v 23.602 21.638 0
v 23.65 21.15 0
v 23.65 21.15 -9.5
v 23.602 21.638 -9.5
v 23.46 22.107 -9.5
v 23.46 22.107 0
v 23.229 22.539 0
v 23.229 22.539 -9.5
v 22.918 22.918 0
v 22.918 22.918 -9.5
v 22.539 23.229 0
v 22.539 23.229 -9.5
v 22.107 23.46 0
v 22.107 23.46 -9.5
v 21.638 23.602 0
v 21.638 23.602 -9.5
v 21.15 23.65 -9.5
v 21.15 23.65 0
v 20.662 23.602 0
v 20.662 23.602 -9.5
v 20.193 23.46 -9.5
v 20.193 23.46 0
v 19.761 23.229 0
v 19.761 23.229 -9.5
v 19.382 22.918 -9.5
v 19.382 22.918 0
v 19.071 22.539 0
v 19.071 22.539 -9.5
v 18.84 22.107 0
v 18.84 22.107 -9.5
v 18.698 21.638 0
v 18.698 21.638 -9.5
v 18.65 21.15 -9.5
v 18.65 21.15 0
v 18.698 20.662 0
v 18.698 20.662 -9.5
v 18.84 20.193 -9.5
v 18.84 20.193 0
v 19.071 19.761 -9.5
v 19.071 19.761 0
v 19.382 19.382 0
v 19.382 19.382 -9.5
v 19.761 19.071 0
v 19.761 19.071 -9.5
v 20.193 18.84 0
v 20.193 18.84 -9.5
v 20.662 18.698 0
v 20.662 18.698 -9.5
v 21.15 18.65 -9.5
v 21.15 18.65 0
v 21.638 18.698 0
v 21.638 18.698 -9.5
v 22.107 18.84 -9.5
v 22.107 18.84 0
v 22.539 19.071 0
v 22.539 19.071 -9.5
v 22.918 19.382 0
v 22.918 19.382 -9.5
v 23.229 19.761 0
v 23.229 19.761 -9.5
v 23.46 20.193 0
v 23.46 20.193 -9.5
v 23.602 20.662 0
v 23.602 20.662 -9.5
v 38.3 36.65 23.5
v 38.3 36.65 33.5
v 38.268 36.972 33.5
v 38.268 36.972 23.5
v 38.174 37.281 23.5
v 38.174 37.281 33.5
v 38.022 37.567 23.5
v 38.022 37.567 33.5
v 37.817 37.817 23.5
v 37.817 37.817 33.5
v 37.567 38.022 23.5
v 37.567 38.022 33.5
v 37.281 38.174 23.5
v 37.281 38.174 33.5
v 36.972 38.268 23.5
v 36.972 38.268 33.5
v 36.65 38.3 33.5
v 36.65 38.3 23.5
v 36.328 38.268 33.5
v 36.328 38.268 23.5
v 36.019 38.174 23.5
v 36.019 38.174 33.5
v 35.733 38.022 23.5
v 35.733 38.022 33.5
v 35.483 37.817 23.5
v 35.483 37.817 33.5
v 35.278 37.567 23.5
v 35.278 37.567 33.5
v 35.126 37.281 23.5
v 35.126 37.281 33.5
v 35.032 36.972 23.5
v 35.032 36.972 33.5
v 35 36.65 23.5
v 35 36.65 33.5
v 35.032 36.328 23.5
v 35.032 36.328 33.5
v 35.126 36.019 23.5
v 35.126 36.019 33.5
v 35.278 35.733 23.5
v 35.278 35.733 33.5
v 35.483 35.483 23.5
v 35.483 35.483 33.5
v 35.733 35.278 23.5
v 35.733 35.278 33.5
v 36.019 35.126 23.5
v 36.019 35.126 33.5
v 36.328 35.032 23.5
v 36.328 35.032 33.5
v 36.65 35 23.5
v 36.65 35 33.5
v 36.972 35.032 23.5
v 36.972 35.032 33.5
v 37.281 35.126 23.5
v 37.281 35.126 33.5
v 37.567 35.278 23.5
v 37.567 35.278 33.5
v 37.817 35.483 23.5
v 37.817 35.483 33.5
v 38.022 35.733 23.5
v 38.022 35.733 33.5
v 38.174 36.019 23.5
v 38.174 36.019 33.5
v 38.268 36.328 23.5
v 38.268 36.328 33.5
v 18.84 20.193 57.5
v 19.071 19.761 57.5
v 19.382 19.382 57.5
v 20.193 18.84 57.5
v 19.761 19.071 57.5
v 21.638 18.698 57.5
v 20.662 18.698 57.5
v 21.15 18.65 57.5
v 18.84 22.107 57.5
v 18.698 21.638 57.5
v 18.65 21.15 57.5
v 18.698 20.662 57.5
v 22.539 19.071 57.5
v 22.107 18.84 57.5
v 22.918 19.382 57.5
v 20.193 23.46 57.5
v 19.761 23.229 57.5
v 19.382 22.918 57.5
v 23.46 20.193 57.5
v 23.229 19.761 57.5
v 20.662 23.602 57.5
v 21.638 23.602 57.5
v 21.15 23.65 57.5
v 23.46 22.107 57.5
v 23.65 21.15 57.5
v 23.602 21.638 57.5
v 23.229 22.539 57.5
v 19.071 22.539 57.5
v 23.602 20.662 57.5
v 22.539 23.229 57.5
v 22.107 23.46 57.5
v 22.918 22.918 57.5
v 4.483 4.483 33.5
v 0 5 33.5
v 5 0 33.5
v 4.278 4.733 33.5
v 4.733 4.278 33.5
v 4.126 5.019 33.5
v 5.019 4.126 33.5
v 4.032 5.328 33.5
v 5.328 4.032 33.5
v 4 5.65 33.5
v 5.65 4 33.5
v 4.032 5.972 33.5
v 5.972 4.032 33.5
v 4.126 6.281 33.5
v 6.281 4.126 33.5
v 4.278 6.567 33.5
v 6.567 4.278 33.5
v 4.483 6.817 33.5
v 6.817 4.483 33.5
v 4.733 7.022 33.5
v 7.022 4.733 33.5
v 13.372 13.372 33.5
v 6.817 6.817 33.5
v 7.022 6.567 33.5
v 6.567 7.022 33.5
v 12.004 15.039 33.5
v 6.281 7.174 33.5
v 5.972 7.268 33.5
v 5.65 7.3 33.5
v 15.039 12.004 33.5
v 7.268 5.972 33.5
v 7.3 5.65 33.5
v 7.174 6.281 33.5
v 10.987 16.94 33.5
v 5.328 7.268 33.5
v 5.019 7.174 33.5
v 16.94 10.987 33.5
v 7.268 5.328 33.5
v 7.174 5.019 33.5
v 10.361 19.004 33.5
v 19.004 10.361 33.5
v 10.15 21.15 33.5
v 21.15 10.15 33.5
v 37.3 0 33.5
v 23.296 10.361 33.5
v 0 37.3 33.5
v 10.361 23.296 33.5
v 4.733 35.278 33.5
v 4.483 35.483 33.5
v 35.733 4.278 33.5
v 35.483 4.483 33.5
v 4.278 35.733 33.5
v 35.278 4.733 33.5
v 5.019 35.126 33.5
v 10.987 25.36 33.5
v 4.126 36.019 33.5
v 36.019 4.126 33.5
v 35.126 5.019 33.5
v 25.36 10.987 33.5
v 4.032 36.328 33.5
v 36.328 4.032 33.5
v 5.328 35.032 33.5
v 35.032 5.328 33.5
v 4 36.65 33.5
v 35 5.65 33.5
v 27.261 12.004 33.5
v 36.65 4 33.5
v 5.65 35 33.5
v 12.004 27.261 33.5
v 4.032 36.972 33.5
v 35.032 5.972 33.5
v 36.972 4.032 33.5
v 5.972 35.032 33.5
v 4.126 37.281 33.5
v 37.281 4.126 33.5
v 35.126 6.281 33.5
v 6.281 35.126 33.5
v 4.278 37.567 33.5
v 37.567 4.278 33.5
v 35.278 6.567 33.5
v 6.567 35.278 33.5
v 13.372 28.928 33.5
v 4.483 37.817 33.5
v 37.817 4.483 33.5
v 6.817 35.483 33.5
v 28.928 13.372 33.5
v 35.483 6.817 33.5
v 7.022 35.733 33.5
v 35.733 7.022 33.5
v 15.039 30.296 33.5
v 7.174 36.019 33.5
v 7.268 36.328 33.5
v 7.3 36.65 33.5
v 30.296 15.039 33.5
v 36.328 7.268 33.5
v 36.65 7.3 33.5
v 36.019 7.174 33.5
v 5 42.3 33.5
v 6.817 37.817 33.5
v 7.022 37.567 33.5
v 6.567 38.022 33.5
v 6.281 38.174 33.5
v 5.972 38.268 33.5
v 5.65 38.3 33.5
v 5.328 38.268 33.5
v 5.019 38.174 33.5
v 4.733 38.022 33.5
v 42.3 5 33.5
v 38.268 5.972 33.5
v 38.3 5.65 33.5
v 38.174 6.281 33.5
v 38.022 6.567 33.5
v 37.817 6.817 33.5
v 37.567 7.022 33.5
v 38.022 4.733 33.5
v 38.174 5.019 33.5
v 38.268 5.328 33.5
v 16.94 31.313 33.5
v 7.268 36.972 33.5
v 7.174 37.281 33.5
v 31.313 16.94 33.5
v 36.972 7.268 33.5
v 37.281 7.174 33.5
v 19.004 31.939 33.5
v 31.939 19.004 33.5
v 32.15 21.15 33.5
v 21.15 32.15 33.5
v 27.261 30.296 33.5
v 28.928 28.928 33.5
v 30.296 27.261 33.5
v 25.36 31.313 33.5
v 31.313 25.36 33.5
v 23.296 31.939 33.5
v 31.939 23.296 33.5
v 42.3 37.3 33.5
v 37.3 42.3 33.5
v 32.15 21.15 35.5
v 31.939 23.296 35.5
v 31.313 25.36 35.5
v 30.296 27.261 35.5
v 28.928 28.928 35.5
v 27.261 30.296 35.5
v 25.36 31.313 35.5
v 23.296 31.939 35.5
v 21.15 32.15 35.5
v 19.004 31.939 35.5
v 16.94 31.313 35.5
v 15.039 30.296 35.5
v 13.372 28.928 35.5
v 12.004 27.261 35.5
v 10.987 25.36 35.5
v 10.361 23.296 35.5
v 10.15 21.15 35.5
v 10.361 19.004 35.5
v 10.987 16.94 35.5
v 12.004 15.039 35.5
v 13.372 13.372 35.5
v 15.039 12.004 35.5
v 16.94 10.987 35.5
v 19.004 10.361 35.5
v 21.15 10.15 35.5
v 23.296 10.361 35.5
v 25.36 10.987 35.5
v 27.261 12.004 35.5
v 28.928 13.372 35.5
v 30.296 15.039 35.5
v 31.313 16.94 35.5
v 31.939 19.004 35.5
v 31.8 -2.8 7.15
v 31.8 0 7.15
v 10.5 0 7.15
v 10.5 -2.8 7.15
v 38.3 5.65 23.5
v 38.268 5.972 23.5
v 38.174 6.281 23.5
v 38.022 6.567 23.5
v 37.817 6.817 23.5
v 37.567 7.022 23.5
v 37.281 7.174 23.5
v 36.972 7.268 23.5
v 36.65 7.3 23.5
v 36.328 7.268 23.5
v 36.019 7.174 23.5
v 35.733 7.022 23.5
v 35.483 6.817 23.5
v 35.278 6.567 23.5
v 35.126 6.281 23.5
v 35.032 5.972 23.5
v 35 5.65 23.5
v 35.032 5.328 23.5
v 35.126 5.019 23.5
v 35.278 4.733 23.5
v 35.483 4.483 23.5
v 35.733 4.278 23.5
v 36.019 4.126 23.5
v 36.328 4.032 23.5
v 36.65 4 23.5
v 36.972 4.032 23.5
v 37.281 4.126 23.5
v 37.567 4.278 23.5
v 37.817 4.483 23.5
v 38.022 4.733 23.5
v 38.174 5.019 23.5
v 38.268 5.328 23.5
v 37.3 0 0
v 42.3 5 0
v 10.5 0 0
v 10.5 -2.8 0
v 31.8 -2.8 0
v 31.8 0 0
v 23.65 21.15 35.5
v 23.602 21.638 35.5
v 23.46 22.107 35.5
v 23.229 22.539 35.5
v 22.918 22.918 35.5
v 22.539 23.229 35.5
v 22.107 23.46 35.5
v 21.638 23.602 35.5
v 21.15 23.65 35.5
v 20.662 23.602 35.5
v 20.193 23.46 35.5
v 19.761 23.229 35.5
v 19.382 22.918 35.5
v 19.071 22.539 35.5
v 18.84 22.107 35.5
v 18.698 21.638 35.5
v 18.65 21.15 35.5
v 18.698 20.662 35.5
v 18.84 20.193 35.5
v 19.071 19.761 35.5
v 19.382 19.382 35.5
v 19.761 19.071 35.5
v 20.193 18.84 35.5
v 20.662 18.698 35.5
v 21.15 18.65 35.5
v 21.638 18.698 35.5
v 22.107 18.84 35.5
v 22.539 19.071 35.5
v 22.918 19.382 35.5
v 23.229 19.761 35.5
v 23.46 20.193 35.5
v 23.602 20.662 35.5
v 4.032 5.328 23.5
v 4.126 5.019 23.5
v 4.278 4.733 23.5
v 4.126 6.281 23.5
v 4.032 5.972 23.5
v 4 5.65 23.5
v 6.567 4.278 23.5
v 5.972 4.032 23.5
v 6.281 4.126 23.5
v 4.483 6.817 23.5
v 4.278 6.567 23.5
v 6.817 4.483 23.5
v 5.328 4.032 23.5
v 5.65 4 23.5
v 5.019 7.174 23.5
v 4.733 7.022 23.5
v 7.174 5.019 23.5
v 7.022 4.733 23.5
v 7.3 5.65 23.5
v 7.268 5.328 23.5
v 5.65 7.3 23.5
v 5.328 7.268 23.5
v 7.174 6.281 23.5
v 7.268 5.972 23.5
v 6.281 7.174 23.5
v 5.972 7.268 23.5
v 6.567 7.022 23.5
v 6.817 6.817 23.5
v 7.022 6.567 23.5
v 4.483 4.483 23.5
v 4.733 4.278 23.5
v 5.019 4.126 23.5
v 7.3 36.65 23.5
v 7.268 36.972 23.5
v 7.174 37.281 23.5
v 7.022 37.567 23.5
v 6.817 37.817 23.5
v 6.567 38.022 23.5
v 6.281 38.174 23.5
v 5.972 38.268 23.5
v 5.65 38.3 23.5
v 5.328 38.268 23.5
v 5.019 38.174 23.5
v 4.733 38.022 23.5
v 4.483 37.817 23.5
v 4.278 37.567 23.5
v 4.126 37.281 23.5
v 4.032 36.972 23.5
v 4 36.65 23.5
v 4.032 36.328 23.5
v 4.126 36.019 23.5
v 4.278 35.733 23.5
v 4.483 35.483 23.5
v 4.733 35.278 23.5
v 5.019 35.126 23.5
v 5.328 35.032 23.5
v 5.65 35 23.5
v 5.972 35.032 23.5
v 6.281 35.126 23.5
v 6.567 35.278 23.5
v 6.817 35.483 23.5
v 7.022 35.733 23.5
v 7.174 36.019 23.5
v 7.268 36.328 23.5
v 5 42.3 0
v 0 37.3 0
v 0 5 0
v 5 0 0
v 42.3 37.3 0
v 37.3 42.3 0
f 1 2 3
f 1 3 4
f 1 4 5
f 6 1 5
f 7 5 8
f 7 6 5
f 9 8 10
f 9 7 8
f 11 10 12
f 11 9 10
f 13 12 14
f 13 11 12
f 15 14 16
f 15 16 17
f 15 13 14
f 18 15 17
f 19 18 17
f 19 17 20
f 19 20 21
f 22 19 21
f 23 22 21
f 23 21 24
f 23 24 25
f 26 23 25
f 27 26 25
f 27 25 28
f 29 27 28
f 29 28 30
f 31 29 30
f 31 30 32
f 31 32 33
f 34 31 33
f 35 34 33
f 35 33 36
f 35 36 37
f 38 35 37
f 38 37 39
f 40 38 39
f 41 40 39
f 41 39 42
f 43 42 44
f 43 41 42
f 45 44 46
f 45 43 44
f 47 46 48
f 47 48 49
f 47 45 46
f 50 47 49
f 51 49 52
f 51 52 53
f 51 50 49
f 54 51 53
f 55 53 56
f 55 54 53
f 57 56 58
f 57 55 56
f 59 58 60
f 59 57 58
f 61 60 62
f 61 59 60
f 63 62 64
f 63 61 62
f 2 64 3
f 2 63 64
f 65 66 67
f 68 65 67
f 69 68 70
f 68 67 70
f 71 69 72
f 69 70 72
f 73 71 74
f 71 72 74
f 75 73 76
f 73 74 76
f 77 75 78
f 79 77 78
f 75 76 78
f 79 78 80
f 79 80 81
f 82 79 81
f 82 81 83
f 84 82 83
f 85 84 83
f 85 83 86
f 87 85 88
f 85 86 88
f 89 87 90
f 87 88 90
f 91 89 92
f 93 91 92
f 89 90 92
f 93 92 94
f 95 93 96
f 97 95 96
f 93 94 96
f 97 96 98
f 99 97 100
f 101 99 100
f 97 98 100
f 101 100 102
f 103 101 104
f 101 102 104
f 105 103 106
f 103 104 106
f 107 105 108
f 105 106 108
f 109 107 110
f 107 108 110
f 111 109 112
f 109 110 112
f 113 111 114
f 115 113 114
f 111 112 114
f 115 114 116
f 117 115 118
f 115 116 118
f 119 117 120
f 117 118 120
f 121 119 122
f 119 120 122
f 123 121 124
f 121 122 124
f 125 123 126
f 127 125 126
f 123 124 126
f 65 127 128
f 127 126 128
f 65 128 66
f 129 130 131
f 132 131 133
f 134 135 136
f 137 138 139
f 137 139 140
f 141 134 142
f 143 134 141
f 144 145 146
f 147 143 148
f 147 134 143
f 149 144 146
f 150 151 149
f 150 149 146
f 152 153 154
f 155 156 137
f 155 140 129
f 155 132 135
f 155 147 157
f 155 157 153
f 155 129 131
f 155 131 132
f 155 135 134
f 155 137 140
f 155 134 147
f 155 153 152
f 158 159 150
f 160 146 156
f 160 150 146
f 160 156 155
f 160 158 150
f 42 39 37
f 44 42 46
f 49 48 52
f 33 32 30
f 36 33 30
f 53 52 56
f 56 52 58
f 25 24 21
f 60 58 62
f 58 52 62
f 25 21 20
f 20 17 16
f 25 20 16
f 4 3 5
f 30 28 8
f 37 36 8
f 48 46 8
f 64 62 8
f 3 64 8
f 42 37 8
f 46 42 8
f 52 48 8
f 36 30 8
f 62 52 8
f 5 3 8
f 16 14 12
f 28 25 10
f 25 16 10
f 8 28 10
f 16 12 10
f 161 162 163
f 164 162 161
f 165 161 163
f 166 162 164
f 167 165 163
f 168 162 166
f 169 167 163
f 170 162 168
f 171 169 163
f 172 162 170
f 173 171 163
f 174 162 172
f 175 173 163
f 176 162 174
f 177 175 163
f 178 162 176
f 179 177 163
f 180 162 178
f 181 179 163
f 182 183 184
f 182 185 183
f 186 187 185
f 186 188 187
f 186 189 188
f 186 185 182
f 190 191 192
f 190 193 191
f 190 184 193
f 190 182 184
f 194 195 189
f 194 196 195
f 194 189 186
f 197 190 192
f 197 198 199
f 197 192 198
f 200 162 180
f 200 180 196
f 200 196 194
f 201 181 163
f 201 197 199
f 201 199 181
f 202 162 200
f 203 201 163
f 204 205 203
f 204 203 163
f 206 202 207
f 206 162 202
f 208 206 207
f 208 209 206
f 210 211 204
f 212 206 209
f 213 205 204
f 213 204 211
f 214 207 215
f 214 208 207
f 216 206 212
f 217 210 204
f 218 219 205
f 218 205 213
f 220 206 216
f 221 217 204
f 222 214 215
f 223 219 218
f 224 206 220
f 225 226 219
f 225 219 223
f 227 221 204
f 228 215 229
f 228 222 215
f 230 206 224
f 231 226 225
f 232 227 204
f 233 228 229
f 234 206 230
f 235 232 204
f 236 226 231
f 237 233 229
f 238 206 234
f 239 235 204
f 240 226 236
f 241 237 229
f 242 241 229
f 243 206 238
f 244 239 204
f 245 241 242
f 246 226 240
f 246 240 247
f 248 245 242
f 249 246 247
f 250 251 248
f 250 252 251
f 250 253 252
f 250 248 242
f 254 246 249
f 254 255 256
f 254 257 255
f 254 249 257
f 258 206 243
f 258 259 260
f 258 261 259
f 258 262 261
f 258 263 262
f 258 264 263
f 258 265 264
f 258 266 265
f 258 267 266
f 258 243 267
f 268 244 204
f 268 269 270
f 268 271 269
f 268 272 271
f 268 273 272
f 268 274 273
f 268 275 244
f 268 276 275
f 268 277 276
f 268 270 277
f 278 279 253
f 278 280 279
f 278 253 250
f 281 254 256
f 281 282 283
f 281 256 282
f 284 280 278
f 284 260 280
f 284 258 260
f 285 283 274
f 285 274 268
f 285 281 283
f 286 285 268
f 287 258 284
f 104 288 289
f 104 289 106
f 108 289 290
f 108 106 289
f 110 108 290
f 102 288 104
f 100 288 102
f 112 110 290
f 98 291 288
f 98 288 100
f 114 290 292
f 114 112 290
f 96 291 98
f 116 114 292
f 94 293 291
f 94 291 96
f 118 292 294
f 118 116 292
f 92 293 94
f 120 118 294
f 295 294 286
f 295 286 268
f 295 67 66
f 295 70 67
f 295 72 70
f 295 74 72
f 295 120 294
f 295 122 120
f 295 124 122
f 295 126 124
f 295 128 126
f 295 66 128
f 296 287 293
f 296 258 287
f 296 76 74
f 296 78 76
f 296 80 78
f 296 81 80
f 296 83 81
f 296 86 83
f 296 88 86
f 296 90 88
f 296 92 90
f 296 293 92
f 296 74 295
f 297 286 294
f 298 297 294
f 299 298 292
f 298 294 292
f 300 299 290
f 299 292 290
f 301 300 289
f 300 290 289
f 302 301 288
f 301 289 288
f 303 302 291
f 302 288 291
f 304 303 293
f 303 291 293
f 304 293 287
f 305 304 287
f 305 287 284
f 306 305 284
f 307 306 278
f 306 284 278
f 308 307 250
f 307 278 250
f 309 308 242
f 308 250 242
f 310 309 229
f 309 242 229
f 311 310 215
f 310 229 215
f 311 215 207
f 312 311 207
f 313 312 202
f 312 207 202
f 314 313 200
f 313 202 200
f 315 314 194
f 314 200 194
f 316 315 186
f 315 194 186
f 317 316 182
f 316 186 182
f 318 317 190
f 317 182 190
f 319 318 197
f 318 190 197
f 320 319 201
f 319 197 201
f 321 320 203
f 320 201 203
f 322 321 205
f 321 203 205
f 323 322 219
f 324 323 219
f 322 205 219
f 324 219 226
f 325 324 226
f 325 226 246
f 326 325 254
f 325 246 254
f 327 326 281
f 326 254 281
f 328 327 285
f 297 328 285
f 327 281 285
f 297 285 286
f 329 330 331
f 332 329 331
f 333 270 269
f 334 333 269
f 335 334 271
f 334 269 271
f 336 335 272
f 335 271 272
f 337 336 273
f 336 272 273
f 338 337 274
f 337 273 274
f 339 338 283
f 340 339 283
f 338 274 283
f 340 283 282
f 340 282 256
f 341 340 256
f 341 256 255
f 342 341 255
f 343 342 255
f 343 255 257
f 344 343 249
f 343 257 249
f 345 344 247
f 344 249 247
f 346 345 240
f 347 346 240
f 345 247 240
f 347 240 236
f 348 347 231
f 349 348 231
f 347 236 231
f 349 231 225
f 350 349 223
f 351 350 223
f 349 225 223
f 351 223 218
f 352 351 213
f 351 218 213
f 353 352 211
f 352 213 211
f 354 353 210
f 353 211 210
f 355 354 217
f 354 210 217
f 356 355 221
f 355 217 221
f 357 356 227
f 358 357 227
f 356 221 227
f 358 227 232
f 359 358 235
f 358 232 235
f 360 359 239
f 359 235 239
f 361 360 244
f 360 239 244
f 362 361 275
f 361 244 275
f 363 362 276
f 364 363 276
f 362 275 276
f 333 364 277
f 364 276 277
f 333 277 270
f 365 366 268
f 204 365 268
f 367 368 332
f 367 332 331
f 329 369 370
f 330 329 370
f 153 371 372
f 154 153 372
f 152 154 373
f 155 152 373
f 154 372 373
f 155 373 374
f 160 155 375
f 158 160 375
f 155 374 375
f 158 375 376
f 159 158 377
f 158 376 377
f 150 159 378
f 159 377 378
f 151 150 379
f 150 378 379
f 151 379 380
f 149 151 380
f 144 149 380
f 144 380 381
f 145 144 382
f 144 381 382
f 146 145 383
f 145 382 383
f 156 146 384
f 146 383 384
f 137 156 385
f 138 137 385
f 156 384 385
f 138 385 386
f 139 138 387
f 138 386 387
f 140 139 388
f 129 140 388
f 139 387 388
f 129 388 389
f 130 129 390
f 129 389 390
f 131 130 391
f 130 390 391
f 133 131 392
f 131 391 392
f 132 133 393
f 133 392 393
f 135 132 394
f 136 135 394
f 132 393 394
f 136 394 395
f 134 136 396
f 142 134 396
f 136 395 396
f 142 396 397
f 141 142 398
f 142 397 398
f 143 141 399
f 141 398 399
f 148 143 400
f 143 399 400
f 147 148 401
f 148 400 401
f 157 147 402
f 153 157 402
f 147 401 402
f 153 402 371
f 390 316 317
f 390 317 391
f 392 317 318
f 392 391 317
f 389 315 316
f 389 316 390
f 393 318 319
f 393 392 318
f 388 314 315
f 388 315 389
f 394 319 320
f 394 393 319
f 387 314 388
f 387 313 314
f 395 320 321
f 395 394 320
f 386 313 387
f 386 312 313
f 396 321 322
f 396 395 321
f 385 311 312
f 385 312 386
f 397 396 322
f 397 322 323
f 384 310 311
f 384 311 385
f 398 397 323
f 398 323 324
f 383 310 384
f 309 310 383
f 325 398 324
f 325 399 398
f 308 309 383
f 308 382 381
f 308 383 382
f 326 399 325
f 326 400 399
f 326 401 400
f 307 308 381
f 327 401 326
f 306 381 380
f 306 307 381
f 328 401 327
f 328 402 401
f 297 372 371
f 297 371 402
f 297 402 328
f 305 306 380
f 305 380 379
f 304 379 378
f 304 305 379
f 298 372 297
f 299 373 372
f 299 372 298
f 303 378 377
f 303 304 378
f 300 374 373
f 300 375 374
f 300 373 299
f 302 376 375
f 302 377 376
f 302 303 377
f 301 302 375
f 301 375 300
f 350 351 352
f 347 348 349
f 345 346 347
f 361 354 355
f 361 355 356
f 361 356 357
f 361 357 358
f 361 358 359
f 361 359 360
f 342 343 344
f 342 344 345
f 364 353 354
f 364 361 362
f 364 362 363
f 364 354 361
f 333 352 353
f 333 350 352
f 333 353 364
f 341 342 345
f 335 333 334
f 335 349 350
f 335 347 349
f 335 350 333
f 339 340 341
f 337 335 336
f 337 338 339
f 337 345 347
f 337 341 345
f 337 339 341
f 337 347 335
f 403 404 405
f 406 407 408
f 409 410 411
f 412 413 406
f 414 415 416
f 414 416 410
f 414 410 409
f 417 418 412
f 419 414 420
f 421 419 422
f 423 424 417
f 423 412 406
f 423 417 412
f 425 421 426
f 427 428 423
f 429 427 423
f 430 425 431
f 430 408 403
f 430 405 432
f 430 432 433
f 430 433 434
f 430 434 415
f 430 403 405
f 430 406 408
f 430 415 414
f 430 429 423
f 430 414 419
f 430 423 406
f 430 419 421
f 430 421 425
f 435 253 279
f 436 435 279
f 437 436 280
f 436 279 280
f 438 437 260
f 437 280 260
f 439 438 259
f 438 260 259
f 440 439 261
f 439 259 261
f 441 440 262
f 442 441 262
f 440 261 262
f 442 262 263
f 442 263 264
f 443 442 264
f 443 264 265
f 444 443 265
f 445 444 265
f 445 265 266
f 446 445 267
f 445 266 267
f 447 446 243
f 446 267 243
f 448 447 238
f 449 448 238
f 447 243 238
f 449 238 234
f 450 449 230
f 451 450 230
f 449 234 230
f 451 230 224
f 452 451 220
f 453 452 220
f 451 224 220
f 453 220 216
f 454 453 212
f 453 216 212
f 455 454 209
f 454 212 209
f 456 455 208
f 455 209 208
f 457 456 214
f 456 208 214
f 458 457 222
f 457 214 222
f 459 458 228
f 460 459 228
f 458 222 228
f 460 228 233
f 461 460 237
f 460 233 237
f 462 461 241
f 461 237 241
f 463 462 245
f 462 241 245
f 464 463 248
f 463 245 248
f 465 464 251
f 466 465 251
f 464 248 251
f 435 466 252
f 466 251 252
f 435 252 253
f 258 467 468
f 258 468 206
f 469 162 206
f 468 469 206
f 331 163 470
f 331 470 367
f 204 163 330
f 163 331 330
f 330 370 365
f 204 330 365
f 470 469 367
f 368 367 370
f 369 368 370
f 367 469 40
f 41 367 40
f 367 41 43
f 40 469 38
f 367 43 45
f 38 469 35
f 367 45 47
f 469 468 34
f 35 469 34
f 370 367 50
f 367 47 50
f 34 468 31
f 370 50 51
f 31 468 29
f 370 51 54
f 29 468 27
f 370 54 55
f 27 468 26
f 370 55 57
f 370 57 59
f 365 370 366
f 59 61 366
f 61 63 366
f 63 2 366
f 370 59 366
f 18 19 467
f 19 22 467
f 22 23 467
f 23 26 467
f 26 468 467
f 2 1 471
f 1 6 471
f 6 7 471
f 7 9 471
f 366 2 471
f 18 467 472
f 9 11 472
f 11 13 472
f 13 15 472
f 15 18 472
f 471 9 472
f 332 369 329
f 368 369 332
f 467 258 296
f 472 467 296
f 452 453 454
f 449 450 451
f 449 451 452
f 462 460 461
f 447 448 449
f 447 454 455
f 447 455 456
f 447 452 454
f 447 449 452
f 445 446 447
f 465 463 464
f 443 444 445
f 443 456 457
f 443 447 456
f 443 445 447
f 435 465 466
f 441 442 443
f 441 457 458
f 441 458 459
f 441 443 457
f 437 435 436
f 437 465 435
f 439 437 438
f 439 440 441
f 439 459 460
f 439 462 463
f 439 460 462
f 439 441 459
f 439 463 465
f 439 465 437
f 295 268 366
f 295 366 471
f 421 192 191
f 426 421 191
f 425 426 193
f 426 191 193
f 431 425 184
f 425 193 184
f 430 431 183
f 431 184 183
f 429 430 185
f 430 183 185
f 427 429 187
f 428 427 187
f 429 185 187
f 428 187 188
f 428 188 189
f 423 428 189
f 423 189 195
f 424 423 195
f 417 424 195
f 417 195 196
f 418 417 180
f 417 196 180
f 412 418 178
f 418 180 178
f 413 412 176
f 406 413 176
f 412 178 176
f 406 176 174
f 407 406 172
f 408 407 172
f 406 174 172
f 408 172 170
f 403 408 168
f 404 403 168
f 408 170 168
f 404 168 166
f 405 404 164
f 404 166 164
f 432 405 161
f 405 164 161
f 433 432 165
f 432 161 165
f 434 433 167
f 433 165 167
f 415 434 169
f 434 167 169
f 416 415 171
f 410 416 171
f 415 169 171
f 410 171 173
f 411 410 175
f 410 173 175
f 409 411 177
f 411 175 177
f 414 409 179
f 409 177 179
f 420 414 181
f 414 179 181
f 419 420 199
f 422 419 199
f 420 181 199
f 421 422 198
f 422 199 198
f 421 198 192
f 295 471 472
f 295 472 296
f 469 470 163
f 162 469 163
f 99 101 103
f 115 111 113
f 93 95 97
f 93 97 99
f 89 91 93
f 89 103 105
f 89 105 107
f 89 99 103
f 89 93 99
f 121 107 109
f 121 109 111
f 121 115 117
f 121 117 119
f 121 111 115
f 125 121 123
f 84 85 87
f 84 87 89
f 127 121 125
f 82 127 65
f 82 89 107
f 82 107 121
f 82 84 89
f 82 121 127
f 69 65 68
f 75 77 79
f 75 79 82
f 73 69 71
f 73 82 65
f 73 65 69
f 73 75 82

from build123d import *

# Parameters (mm, degrees)
SKETCH1_W                = 42.3
SKETCH1_H                = 42.3
BOSS_EXTRUDE1_DEPTH      = 33.5
SKETCH2_R                = 1.65
CUT_EXTRUDE1_DEPTH       = 10
SKETCH3_R                = 11
BOSS_EXTRUDE2_DEPTH      = 2
SKETCH4_R                = 2.5
BOSS_EXTRUDE3_DEPTH      = 22
BOSS_EXTRUDE3_DEPTH_BACK = 45
SKETCH5_W                = 21.3
SKETCH5_H                = 2.8
BOSS_EXTRUDE4_DEPTH      = 7.15
CHAMFER1_SIZE            = 5


with BuildPart() as part:
    # Sketch1 → Boss-Extrude1 (new body)
    with BuildSketch(Plane.XY):
        with Locations((21.15, 21.15)):
            Rectangle(SKETCH1_W, SKETCH1_H)
    extrude(amount=BOSS_EXTRUDE1_DEPTH)

    # Sketch2 → Cut-Extrude1 (cut)
    with BuildSketch(Plane.XY.offset(33.5)):
        with Locations((5.65, 36.65)):
            Circle(SKETCH2_R)
        with Locations((36.65, 36.65)):
            Circle(SKETCH2_R)
        with Locations((5.65, 5.65)):
            Circle(SKETCH2_R)
        with Locations((36.65, 5.65)):
            Circle(SKETCH2_R)
    extrude(amount=-CUT_EXTRUDE1_DEPTH, mode=Mode.SUBTRACT)

    # Sketch3 → Boss-Extrude2 (add)
    with BuildSketch(Plane.XY.offset(33.5)):
        with Locations((21.15, 21.15)):
            Circle(SKETCH3_R)
    extrude(amount=BOSS_EXTRUDE2_DEPTH)

    # Sketch4 → Boss-Extrude3 (add, two sides)
    with BuildSketch(Plane.XY.offset(35.5)) as boss_extrude3_sk:
        with Locations((21.15, 21.15)):
            Circle(SKETCH4_R)
    extrude(amount=BOSS_EXTRUDE3_DEPTH)
    extrude(boss_extrude3_sk.sketch, amount=-BOSS_EXTRUDE3_DEPTH_BACK)

    # Sketch5 → Boss-Extrude4 (add)
    with BuildSketch(Plane(origin=(0, 0, 0), x_dir=(-1, 0, 0), z_dir=(0, 0, -1))):
        with Locations((-21.15, -1.4)):
            Rectangle(SKETCH5_W, SKETCH5_H)
    extrude(amount=-BOSS_EXTRUDE4_DEPTH)

    # Chamfer1
    chamfer1_edges = [part.edges().sort_by_distance(p)[0] for p in [
        (0, 0, 16.75),
        (42.3, 0, 16.75),
        (42.3, 42.3, 16.75),
        (0, 42.3, 16.75),
    ]]
    chamfer(chamfer1_edges, length=CHAMFER1_SIZE)


solid = part.part
